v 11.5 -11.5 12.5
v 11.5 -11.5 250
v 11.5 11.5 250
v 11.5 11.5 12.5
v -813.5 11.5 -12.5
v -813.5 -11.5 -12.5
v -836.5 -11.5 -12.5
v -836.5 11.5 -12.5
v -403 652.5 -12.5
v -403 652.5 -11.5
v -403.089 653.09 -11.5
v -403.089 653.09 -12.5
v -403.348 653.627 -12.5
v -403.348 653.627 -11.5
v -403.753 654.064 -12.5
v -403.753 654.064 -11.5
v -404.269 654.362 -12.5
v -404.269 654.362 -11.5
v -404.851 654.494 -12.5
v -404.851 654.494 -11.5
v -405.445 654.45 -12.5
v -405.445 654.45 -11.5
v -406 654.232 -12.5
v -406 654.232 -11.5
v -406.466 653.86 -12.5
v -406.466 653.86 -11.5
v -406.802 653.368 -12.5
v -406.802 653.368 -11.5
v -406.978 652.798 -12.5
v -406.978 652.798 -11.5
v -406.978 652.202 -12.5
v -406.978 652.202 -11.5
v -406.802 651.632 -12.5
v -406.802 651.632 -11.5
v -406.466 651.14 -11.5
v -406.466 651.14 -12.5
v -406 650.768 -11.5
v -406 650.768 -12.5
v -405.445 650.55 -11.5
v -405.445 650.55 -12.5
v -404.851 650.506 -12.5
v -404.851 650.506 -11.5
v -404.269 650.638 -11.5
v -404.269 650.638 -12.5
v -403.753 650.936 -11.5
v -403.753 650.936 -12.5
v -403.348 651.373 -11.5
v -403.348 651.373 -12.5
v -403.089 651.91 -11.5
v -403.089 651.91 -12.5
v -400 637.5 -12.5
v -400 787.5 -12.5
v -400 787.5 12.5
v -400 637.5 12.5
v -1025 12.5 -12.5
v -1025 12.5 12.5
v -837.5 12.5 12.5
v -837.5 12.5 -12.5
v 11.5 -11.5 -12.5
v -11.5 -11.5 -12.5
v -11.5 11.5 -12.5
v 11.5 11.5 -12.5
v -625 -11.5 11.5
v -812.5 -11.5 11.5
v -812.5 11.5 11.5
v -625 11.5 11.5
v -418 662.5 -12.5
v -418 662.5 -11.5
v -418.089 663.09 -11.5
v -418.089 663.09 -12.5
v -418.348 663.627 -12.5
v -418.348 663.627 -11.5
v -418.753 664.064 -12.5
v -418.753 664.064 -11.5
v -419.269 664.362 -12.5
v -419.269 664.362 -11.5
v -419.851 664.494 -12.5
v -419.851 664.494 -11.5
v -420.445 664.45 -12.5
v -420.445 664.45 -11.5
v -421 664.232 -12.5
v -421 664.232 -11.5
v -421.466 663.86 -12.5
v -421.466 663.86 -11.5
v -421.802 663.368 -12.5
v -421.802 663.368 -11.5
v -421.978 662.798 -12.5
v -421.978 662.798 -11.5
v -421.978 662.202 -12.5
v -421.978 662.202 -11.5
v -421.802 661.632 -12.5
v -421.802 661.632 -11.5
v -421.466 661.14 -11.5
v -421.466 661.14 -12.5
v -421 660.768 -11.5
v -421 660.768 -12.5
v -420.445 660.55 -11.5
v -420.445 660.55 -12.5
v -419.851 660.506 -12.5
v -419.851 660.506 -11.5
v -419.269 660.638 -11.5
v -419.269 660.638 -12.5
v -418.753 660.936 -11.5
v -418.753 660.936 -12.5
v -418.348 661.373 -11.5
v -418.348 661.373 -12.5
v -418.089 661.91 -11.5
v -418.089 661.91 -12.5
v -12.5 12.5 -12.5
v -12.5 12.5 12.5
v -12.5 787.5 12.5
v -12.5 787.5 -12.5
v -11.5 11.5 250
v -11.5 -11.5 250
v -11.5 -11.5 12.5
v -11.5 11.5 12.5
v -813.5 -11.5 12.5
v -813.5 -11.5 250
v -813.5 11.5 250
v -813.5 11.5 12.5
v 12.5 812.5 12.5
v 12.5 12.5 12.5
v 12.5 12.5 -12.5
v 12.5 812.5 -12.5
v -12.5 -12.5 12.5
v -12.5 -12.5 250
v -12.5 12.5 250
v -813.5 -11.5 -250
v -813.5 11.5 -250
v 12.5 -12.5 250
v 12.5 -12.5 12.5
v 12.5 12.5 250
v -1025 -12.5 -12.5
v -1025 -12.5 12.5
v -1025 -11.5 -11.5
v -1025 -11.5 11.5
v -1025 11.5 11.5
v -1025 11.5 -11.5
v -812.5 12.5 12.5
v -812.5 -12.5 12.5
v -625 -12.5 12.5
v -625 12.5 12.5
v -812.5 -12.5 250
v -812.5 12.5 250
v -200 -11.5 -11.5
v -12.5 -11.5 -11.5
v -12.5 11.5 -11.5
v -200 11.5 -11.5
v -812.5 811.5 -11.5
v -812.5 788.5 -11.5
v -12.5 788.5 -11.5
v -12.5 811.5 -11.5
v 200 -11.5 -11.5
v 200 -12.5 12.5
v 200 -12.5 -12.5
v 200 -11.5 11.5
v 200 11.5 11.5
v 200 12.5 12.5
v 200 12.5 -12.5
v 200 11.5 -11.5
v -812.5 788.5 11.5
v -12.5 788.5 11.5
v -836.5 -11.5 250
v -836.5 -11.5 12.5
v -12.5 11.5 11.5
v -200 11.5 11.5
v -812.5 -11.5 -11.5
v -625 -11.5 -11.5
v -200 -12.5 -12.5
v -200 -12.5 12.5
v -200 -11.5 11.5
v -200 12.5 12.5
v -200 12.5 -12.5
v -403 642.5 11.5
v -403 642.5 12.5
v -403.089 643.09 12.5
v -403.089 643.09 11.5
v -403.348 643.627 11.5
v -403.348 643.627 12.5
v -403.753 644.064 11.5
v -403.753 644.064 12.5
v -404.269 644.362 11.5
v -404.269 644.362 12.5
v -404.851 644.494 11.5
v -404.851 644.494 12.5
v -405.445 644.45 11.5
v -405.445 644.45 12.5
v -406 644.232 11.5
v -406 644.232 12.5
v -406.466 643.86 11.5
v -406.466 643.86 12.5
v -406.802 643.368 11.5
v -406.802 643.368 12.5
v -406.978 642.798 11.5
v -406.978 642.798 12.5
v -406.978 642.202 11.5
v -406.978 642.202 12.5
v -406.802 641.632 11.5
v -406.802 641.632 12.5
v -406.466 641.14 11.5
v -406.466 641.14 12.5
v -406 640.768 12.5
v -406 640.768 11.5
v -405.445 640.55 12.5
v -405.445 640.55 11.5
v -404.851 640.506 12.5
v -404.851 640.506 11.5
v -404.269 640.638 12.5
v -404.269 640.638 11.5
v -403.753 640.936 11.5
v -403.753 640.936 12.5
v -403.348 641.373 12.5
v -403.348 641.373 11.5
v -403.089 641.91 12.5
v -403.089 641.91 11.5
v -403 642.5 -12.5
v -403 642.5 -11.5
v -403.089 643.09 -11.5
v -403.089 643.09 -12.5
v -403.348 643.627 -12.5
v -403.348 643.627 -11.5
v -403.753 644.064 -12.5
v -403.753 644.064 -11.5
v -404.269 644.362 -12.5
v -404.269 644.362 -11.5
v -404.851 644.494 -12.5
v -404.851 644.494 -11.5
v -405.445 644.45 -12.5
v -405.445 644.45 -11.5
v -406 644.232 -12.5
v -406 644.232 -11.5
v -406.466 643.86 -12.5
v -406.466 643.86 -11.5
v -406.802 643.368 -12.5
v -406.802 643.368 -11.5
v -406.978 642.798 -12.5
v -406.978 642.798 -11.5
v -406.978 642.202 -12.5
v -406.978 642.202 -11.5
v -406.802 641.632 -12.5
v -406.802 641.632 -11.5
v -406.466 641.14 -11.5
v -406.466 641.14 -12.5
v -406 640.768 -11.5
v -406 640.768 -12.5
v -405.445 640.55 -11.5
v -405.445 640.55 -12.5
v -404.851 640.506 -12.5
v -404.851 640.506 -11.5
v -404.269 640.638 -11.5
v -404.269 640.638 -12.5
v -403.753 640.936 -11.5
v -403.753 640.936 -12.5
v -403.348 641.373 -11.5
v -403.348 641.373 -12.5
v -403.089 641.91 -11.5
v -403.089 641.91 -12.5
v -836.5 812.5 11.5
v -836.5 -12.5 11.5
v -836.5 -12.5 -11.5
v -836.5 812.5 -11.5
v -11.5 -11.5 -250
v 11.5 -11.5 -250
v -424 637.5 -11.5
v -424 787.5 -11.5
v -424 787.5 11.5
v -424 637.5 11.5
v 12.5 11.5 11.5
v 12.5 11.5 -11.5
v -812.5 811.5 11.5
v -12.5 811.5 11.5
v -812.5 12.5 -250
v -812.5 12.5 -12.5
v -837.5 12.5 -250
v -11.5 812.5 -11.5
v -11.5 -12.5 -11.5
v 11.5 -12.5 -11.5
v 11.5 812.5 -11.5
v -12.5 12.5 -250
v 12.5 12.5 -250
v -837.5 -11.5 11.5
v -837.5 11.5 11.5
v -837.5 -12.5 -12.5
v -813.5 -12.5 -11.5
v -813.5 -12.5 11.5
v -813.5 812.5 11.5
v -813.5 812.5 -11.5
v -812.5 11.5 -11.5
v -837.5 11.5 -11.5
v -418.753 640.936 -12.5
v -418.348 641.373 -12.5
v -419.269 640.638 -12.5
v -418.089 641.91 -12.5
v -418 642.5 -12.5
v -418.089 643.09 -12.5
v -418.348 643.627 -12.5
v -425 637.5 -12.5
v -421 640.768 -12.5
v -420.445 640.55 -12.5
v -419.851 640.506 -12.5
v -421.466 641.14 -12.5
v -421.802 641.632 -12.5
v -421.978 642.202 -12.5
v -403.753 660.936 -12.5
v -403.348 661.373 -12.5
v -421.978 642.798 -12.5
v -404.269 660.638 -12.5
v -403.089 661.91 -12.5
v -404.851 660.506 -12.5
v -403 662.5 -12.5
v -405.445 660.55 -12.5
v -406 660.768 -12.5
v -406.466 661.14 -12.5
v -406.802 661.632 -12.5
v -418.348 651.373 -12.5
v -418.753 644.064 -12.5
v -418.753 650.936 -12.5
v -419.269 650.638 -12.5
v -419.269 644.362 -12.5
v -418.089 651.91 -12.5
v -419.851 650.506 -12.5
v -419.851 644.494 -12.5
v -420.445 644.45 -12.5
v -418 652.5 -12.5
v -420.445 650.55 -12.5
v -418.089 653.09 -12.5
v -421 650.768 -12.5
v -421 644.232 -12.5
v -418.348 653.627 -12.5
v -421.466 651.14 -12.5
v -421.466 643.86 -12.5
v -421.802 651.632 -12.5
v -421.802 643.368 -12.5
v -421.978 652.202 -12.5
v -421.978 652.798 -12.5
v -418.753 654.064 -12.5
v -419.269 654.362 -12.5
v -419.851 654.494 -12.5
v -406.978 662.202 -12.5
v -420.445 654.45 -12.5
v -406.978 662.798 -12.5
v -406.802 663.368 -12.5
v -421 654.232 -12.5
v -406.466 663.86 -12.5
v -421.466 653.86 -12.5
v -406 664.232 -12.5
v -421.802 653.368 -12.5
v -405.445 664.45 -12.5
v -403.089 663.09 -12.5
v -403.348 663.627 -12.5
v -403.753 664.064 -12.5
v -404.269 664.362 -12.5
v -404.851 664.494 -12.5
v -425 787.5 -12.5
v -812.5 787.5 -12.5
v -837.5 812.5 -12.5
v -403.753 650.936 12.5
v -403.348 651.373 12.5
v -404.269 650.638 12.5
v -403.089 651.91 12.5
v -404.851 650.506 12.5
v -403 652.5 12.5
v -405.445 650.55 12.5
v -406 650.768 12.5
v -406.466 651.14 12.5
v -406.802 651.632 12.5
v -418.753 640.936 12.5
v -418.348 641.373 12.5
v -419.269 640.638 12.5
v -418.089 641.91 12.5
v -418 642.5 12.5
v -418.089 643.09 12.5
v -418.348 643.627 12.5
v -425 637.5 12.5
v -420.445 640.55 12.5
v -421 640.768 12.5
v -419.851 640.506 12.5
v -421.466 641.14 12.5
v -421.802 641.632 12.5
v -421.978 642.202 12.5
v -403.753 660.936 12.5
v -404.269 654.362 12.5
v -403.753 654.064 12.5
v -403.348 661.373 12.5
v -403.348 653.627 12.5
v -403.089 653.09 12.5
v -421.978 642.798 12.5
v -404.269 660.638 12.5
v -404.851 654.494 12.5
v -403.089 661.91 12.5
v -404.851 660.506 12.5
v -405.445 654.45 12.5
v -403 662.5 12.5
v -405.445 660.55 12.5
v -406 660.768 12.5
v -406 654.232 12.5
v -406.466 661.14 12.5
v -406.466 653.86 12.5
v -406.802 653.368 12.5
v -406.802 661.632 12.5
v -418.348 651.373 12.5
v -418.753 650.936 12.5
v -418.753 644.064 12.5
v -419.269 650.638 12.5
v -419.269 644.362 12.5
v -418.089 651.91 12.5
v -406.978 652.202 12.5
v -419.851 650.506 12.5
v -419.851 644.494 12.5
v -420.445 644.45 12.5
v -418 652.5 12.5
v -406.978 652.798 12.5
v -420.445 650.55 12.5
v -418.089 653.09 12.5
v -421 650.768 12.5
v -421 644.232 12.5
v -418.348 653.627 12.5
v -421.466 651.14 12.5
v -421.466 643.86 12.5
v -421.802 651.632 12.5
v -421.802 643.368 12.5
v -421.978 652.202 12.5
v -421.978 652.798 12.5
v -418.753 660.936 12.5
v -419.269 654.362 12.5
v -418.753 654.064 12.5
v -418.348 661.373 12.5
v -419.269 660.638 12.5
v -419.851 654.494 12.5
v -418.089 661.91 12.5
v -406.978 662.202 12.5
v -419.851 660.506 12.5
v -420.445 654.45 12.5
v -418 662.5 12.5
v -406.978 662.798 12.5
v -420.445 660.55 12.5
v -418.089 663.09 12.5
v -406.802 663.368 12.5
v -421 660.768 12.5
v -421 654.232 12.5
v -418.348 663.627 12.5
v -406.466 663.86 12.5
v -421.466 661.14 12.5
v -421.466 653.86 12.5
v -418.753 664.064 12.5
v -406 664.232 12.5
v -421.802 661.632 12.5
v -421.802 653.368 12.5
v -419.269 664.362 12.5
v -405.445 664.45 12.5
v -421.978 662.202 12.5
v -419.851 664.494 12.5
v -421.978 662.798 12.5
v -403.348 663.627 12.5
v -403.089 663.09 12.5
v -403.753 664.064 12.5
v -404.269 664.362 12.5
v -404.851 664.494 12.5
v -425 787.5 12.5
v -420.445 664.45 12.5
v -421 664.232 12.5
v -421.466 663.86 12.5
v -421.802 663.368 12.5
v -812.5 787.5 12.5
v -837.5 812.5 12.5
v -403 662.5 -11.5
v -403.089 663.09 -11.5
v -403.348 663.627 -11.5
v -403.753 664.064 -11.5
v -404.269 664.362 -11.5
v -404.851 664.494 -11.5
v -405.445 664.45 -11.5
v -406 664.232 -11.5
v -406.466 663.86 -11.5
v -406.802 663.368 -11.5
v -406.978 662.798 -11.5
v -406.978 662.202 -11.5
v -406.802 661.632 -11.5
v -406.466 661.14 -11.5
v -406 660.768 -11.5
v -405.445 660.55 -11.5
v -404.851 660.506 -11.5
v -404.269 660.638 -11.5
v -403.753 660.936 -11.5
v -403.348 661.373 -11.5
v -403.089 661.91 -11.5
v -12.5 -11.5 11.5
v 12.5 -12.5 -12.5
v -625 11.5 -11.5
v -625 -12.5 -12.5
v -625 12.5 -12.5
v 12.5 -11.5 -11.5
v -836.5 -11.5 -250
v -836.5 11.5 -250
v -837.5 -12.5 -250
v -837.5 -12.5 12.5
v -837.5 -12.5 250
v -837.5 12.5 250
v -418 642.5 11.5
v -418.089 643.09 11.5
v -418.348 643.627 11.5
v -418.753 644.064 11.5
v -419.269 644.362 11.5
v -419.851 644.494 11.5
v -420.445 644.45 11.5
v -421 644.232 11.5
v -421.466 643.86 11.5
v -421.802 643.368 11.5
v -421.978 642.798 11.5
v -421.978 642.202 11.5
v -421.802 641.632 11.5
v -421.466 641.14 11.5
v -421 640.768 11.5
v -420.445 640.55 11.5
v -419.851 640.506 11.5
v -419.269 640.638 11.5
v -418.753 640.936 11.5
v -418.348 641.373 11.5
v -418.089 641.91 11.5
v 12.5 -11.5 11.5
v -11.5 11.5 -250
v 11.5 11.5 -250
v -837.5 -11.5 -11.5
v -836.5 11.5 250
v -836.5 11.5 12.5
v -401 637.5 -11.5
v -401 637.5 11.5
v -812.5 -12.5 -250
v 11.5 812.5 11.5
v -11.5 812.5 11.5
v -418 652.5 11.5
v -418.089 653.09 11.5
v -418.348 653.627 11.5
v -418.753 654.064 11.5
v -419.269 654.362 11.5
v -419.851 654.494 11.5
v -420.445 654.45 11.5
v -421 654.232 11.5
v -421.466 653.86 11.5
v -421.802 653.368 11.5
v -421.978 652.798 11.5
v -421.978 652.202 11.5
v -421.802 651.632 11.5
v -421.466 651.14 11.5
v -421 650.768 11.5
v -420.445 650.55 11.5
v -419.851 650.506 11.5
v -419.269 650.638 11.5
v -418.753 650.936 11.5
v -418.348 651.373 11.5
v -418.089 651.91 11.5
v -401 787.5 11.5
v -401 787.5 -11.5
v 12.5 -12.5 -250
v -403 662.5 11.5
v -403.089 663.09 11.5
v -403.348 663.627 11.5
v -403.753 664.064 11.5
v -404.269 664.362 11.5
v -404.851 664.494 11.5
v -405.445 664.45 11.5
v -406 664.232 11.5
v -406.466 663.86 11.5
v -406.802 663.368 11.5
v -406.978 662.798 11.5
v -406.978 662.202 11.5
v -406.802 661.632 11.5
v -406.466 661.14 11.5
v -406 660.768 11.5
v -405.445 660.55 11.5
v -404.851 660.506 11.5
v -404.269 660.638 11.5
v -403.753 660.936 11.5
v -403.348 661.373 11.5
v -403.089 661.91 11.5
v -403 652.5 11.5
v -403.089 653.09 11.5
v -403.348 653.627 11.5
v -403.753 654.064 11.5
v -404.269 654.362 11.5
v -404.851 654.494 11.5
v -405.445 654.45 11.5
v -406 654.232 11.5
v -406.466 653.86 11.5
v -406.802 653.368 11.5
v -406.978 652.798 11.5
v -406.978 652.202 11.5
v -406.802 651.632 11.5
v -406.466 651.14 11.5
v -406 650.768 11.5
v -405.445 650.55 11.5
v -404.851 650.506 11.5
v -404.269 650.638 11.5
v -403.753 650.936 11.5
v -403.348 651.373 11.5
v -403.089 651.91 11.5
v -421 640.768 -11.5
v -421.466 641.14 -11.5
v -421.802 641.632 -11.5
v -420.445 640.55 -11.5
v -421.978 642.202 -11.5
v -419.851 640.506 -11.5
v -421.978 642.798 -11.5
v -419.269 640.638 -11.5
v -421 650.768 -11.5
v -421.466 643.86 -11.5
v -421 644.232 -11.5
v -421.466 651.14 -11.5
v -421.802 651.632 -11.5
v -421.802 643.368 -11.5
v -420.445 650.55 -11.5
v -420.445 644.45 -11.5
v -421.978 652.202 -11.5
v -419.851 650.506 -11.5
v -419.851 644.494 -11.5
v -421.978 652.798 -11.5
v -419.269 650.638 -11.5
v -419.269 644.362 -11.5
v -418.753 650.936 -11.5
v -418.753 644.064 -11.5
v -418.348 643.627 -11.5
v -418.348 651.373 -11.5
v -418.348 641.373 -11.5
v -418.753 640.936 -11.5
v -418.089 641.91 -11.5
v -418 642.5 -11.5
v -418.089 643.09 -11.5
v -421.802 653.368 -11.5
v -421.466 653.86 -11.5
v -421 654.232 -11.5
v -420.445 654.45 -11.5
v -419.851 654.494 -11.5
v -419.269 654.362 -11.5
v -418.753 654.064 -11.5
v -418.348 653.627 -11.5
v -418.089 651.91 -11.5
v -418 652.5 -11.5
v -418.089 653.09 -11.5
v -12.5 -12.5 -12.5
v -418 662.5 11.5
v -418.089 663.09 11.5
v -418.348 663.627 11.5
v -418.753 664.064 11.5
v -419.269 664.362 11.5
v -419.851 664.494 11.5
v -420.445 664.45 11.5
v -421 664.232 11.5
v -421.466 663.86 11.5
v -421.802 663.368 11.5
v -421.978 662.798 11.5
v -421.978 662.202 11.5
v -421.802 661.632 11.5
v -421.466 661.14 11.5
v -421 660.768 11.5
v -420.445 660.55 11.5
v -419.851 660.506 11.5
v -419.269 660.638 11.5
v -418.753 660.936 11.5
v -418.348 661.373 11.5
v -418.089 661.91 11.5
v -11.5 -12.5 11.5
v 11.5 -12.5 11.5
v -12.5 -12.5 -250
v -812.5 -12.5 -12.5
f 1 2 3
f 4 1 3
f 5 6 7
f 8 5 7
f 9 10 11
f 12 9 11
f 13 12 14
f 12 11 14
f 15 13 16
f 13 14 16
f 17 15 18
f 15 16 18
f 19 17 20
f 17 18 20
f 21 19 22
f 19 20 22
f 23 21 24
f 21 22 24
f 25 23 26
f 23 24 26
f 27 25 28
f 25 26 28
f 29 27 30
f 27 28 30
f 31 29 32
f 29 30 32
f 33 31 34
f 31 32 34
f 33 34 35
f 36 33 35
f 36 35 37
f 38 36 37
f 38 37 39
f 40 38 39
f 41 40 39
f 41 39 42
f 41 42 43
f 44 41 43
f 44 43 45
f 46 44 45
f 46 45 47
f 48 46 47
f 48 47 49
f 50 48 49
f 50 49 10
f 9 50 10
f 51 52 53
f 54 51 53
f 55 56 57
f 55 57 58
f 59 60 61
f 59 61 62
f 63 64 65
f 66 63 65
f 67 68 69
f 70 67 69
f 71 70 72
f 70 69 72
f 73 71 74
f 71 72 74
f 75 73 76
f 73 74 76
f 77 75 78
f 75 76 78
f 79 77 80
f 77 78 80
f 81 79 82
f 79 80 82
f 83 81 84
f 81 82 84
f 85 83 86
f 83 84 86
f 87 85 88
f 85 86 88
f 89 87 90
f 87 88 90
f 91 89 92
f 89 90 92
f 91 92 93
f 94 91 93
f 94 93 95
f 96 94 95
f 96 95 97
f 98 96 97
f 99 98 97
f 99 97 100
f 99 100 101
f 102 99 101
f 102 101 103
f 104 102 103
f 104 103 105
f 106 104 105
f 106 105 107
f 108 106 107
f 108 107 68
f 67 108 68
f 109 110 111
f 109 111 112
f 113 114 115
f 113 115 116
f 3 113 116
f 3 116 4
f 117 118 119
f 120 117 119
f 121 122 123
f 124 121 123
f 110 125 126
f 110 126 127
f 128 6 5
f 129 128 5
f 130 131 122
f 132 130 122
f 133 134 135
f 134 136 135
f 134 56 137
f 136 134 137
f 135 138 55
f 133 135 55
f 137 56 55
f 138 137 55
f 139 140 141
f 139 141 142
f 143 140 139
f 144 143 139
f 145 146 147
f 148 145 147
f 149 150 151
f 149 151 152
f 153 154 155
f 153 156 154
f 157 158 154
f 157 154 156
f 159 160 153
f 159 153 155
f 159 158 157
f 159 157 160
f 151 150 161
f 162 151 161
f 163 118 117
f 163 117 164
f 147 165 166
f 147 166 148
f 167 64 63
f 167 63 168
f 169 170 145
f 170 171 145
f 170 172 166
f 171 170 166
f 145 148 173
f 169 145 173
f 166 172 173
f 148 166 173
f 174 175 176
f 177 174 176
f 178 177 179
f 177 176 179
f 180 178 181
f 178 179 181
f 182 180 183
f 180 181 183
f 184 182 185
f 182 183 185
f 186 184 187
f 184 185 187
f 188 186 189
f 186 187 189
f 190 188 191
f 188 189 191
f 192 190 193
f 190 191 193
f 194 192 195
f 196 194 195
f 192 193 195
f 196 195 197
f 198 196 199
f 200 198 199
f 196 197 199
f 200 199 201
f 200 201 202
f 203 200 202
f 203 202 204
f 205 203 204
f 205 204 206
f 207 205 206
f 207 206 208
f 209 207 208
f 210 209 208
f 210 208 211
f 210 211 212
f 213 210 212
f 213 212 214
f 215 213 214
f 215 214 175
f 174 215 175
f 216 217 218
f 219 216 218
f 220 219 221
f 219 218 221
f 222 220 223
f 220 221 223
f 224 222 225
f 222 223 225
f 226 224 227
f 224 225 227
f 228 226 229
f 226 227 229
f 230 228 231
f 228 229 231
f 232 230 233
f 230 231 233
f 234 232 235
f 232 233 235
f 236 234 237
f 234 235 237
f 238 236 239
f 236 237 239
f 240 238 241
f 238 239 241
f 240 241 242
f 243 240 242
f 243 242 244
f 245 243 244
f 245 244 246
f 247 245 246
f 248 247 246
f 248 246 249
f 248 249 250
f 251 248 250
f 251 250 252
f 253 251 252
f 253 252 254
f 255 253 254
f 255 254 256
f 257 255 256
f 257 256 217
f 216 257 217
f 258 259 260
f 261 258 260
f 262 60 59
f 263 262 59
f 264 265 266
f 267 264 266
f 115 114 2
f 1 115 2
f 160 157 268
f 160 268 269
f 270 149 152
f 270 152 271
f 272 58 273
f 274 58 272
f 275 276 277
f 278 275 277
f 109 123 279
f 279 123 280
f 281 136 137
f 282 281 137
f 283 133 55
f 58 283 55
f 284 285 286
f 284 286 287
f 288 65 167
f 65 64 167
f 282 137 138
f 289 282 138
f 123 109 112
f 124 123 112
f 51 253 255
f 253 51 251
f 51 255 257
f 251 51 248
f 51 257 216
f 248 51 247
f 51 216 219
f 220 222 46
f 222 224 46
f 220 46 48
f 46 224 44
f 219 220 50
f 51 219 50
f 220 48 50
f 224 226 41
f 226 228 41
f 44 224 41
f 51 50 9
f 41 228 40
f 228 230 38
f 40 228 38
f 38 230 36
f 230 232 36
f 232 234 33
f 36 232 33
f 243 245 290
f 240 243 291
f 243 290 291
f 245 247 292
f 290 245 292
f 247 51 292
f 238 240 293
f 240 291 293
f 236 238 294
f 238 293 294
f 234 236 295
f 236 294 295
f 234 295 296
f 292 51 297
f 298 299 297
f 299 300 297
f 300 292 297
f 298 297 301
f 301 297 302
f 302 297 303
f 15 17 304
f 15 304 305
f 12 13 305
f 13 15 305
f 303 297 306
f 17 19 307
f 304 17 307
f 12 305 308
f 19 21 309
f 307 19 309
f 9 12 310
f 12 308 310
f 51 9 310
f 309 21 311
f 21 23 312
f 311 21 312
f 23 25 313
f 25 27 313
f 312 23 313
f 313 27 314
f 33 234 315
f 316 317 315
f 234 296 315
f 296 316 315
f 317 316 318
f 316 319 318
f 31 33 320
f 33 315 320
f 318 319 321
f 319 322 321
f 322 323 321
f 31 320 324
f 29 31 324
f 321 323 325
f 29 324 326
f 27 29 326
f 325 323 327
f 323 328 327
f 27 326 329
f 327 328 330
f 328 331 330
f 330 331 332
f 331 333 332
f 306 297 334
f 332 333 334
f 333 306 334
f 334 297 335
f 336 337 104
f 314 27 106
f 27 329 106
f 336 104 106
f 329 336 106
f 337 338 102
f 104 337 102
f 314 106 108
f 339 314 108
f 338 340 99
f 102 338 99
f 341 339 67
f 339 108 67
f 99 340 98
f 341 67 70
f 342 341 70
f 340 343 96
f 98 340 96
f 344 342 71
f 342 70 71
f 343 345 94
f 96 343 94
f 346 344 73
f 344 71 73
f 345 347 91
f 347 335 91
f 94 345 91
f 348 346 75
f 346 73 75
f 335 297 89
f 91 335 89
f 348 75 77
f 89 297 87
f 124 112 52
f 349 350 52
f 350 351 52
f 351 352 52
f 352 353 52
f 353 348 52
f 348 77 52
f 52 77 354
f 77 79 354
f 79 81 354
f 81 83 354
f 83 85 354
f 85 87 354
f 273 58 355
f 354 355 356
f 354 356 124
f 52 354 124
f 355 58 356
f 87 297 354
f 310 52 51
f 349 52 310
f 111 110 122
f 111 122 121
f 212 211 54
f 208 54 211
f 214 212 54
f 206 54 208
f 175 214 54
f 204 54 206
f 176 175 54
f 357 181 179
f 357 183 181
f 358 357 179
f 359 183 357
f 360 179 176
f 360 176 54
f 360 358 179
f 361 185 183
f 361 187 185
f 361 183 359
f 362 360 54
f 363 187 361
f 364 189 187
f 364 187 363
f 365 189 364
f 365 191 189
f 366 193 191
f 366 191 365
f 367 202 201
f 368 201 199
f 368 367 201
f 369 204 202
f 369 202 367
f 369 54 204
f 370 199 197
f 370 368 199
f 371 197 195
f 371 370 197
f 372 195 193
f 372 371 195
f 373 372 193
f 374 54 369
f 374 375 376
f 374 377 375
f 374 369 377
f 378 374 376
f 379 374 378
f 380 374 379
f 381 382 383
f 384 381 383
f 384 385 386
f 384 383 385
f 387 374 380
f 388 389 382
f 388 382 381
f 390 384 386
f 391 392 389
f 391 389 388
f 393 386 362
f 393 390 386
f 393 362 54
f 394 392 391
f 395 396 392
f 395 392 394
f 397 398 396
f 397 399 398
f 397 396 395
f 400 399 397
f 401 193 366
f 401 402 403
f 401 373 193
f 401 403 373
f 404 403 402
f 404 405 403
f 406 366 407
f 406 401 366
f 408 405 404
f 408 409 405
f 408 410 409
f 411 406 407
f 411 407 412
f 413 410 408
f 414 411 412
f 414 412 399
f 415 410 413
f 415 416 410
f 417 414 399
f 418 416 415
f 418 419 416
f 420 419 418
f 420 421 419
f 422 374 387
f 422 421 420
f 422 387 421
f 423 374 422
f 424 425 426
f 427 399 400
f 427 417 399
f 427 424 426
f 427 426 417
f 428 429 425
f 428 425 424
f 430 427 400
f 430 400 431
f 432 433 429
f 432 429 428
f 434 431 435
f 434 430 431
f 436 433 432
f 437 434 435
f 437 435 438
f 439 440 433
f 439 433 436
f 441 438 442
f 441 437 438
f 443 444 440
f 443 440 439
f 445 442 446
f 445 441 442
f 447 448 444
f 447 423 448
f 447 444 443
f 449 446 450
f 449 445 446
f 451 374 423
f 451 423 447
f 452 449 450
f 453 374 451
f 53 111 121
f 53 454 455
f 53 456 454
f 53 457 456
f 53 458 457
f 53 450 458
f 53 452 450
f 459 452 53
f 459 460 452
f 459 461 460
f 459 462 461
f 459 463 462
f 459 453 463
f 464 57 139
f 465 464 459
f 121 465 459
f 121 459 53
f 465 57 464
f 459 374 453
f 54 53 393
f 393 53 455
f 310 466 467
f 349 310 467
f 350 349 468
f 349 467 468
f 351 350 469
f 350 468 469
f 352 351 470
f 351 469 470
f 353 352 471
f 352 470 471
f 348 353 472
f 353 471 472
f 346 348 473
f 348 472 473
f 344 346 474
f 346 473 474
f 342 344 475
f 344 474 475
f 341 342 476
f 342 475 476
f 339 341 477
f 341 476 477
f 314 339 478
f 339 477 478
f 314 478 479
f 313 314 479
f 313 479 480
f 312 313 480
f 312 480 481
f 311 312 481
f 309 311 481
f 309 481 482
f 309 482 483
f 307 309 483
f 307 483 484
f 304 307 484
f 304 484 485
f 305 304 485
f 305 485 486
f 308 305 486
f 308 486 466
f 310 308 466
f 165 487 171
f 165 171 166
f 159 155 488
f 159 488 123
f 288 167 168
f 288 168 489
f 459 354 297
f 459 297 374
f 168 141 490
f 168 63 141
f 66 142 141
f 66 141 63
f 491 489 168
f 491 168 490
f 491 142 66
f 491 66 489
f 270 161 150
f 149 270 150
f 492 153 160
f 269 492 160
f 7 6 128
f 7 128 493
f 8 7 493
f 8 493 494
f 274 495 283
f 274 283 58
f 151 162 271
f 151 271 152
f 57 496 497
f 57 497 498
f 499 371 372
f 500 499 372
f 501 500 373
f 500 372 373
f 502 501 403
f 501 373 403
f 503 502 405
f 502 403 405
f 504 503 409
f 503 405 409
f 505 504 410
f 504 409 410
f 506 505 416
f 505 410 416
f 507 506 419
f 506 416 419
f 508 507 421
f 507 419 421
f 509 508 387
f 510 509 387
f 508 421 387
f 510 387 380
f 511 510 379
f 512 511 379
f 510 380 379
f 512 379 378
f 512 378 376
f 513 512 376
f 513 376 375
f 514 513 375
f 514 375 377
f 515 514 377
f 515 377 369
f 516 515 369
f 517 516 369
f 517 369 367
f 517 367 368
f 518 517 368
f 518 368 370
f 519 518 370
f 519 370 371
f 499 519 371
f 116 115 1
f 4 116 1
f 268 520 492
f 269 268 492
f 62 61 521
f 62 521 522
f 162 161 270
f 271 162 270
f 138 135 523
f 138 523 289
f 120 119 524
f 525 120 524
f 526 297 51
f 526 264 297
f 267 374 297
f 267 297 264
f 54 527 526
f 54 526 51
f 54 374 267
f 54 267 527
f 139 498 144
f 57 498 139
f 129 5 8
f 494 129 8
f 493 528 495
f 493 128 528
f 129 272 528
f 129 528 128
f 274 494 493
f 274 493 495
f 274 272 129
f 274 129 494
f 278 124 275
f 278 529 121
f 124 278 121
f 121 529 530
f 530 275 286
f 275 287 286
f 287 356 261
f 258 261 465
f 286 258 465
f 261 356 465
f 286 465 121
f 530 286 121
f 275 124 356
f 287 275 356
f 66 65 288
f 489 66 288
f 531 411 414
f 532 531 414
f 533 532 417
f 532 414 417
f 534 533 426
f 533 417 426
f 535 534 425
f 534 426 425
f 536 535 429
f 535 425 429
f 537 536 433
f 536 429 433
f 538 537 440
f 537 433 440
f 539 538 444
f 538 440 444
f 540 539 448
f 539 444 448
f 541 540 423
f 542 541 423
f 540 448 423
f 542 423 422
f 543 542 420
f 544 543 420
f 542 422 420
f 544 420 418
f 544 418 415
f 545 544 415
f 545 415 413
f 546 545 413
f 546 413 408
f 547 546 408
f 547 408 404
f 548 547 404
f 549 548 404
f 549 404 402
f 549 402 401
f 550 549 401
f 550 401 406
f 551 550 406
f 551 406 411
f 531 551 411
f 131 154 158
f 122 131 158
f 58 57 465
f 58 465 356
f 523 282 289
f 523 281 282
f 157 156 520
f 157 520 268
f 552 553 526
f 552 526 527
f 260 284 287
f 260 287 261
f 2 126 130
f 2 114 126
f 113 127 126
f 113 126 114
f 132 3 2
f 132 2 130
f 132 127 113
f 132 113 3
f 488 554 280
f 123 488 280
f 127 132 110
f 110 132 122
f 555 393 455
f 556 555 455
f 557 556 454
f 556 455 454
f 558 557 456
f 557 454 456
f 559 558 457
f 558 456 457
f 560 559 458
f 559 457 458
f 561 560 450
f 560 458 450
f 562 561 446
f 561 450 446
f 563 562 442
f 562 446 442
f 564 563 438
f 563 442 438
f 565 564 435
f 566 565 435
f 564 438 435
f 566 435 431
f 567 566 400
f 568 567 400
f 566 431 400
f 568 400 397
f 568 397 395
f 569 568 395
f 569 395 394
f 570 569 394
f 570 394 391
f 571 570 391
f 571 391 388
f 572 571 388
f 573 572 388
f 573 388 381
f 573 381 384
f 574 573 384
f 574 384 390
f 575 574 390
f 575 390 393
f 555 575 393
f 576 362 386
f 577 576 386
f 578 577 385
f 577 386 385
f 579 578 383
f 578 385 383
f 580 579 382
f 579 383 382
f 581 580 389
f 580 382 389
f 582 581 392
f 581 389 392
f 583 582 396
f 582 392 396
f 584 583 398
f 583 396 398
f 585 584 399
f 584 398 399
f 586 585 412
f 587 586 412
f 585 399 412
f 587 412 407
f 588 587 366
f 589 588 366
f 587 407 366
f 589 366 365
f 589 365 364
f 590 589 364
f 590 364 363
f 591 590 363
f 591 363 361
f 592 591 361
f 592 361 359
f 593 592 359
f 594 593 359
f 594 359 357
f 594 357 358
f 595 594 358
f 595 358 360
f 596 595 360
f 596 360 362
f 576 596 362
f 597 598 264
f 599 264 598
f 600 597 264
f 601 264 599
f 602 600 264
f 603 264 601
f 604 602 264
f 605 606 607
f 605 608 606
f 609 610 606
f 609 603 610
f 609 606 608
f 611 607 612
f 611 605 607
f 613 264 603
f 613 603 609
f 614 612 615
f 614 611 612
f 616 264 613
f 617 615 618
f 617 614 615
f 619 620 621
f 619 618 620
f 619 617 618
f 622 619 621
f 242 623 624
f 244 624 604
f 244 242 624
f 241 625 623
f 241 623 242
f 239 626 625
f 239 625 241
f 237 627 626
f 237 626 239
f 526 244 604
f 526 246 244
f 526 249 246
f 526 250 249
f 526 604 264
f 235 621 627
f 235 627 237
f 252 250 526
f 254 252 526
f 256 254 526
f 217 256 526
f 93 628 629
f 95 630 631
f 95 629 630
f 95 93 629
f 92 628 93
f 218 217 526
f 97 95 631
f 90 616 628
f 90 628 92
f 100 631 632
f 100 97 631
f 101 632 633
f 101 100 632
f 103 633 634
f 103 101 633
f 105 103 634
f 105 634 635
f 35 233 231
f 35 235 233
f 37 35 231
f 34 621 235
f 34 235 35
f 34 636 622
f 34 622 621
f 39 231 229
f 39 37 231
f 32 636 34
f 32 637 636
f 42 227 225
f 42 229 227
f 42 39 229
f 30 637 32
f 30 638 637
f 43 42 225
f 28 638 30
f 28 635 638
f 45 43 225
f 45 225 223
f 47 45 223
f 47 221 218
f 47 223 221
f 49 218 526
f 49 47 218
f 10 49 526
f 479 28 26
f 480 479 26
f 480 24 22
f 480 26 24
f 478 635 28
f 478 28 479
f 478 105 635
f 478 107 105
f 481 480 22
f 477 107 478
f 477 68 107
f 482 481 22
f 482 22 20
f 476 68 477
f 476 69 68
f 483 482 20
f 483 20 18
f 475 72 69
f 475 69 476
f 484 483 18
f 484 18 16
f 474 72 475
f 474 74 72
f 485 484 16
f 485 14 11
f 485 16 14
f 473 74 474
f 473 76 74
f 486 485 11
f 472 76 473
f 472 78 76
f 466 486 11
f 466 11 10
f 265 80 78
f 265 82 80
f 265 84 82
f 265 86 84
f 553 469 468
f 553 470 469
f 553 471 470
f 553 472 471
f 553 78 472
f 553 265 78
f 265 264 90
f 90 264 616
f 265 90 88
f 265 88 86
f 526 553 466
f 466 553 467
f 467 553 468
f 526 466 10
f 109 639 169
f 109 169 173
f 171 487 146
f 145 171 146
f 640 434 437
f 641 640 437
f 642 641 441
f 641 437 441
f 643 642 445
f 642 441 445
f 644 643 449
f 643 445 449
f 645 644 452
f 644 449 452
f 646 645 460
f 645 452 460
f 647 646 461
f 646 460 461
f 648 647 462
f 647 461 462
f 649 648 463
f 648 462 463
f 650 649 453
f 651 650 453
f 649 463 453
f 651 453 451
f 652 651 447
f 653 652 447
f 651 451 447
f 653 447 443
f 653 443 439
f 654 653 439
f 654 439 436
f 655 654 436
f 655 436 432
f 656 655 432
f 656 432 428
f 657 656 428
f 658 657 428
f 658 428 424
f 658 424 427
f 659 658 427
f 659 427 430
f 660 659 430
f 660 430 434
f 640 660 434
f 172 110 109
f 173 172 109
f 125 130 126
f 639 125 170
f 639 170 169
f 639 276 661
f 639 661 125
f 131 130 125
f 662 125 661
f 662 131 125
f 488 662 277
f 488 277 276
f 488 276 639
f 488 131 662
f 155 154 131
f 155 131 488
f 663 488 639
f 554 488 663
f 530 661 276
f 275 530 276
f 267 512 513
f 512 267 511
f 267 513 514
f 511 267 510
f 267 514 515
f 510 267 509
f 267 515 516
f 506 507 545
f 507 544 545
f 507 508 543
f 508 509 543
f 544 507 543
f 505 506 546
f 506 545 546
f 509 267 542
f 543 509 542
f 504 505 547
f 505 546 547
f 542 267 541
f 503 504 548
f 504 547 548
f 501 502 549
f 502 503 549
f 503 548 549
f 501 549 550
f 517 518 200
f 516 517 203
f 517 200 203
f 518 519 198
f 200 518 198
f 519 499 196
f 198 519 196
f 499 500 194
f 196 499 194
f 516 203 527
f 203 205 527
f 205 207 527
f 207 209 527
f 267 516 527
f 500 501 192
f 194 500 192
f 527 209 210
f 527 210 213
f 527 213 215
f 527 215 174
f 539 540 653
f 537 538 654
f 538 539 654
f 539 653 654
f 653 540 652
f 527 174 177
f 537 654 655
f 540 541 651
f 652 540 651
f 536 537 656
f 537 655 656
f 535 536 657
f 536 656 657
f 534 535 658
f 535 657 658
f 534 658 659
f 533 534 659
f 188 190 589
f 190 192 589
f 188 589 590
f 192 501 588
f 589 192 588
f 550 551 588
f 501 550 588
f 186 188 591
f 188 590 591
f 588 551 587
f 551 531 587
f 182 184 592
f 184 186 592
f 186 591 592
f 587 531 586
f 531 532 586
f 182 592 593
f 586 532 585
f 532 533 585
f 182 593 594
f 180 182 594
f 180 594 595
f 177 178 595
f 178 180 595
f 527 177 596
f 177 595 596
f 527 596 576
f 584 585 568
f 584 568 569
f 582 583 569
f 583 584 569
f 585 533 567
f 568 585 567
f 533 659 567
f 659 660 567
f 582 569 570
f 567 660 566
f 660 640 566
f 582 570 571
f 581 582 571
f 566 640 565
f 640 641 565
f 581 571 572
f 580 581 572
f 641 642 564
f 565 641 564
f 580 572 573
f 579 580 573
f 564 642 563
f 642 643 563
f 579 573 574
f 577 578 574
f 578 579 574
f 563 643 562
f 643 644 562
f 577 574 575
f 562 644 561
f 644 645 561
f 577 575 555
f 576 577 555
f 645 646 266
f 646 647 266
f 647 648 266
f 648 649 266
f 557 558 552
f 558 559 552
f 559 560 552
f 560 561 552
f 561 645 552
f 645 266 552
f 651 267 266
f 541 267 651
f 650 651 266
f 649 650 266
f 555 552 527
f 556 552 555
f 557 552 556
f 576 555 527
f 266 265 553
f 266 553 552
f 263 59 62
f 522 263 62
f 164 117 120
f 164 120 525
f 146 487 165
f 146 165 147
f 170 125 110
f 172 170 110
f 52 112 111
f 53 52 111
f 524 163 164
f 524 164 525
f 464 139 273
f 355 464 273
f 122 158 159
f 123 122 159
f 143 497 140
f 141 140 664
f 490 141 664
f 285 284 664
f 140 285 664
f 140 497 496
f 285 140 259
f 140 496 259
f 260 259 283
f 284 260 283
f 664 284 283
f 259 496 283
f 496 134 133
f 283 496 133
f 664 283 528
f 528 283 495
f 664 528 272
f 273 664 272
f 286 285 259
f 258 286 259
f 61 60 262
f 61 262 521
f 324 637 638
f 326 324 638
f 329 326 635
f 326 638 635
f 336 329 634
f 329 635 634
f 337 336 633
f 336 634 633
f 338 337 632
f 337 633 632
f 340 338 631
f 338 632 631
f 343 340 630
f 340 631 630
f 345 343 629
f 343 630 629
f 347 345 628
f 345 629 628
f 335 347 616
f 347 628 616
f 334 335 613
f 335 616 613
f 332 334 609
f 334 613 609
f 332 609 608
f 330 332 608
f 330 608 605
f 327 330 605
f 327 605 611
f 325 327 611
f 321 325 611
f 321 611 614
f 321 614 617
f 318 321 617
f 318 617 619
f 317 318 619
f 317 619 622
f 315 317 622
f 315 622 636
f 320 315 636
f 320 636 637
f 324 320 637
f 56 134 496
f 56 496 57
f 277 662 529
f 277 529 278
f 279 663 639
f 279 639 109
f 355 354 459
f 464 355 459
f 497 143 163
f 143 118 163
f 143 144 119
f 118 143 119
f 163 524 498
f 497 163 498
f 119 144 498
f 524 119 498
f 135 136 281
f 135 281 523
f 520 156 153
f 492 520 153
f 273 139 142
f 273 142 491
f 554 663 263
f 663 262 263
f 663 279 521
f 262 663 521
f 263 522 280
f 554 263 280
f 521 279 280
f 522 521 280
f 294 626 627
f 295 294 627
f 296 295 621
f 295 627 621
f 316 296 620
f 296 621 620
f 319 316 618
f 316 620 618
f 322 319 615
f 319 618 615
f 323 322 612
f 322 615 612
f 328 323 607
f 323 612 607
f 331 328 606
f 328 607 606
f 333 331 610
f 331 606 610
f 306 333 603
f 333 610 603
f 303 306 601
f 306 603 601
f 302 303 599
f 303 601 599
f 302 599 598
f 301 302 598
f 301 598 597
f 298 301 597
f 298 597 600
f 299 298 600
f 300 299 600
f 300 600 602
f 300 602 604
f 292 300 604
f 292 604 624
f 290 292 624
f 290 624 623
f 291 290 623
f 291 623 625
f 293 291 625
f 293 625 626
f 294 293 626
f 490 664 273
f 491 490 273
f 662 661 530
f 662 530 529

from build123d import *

# Parameters (mm, degrees)
SKETCH1_W           = 25
SKETCH1_H           = 25
SKETCH1_W_2         = 23
SKETCH1_H_2         = 23
BOSS_EXTRUDE1_DEPTH = 250
SKETCH2_W           = 25
SKETCH2_H           = 25
SKETCH2_W_2         = 23
SKETCH2_H_2         = 23
BOSS_EXTRUDE2_DEPTH = 200
SKETCH4_W           = 25
SKETCH4_H           = 25
CUT_EXTRUDE6_DEPTH  = 25
BOSS_EXTRUDE3_START = -12.5
SKETCH3_W           = 25
SKETCH3_H           = 25
SKETCH3_W_2         = 23
SKETCH3_H_2         = 23
BOSS_EXTRUDE3_DEPTH = 825
SKETCH5_W           = 25
SKETCH5_H           = 25
SKETCH5_W_2         = 23
SKETCH5_H_2         = 23
BOSS_EXTRUDE4_DEPTH = 400
SKETCH6_W           = 25
SKETCH6_H           = 25
SKETCH6_W_2         = 23
SKETCH6_H_2         = 23
BOSS_EXTRUDE5_DEPTH = 150
SKETCH7_R           = 2
CUT_EXTRUDE7_DEPTH  = 25


with BuildPart() as part:
    # Sketch1 → Boss-Extrude1 (new, symmetric)
    with BuildSketch(Plane.XY):
        Rectangle(SKETCH1_W, SKETCH1_H)
        Rectangle(SKETCH1_W_2, SKETCH1_H_2, mode=Mode.SUBTRACT)
    boss_extrude1 = extrude(amount=BOSS_EXTRUDE1_DEPTH, both=True)

    # Sketch2 → Boss-Extrude2 (add, symmetric)
    with BuildSketch(Plane(origin=(0, 0, 0), x_dir=(0, 0, -1), z_dir=(1, 0, 0))):
        Rectangle(SKETCH2_W, SKETCH2_H)
        Rectangle(SKETCH2_W_2, SKETCH2_H_2, mode=Mode.SUBTRACT)
    boss_extrude2 = extrude(amount=BOSS_EXTRUDE2_DEPTH, both=True)

    # Sketch4 → Cut-Extrude6 (cut)
    with BuildSketch(Plane.XZ.offset(12.5)):
        Rectangle(SKETCH4_W, SKETCH4_H)
    cut_extrude6 = extrude(amount=-CUT_EXTRUDE6_DEPTH, mode=Mode.SUBTRACT)


with BuildPart() as cut_extrude6_piece_1:
    # of the separate pieces the step leaves, piece 1, a body of its own (cut_extrude6_pieces)
    add(part.part.solids().sort_by_distance((-12.5, 12.5, -250))[0])



with BuildPart() as cut_extrude6_piece_2:
    # of the separate pieces the step leaves, piece 2, a body of its own (cut_extrude6_pieces)
    add(part.part.solids().sort_by_distance((-12.5, 12.5, 250))[0])


with BuildPart() as cut_extrude6_piece_3:
    # of the separate pieces the step leaves, piece 3, a body of its own (cut_extrude6_pieces)
    add(part.part.solids().sort_by_distance((-200, 12.5, -12.5))[0])


with BuildPart() as cut_extrude6_piece_4:
    # of the separate pieces the step leaves, piece 4, a body of its own (cut_extrude6_pieces)
    add(part.part.solids().sort_by_distance((200, 12.5, 12.5))[0])


with BuildPart() as cut_extrude6_piece_1_1:
    add(cut_extrude6_piece_1.part)

    add(cut_extrude6_piece_2.part)  # Boss-Extrude3 merges Cut-Extrude6 piece 2

    add(cut_extrude6_piece_3.part)  # Boss-Extrude3 merges Cut-Extrude6 piece 3

    add(cut_extrude6_piece_4.part)  # Boss-Extrude3 merges Cut-Extrude6 piece 4
    # Sketch3 → Boss-Extrude3 (add)
    with BuildSketch(Plane(origin=(0, 0, 0), x_dir=(1, 0, 0), z_dir=(0, 1, 0)).offset(BOSS_EXTRUDE3_START)):
        Rectangle(SKETCH3_W, SKETCH3_H)
        Rectangle(SKETCH3_W_2, SKETCH3_H_2, mode=Mode.SUBTRACT)
    boss_extrude3 = extrude(amount=BOSS_EXTRUDE3_DEPTH)

    # Sketch5 → Boss-Extrude4 (add)
    with BuildSketch(Plane.ZY.offset(12.5)):
        with Locations((0, 800)):
            Rectangle(SKETCH5_W, SKETCH5_H)
        with Locations((0, 800)):
            Rectangle(SKETCH5_W_2, SKETCH5_H_2, mode=Mode.SUBTRACT)
    boss_extrude4 = extrude(amount=BOSS_EXTRUDE4_DEPTH)

    # Mirror1: Boss-Extrude1, Boss-Extrude2, Cut-Extrude6, Boss-Extrude3, Boss-Extrude4 across plane
    add(boss_extrude1.mirror(Plane.ZY.offset(412.5)))
    add(boss_extrude2.mirror(Plane.ZY.offset(412.5)))
    add(cut_extrude6.mirror(Plane.ZY.offset(412.5)), mode=Mode.SUBTRACT)
    add(boss_extrude3.mirror(Plane.ZY.offset(412.5)))
    add(boss_extrude4.mirror(Plane.ZY.offset(412.5)))

    # Sketch6 → Boss-Extrude5 (add)
    with BuildSketch(Plane.XZ.offset(-787.5)):
        with Locations((-412.5, 0)):
            Rectangle(SKETCH6_W, SKETCH6_H)
        with Locations((-412.5, 0)):
            Rectangle(SKETCH6_W_2, SKETCH6_H_2, mode=Mode.SUBTRACT)
    extrude(amount=BOSS_EXTRUDE5_DEPTH)

    # Sketch7 → Cut-Extrude7 (cut)
    with BuildSketch(Plane.XY.offset(12.5)):
        with Locations((-420, 662.5)):
            Circle(SKETCH7_R)
        with Locations((-405, 662.5)):
            Circle(SKETCH7_R)
        with Locations((-420, 652.5)):
            Circle(SKETCH7_R)
        with Locations((-405, 652.5)):
            Circle(SKETCH7_R)
        with Locations((-420, 642.5)):
            Circle(SKETCH7_R)
        with Locations((-405, 642.5)):
            Circle(SKETCH7_R)
    extrude(amount=-CUT_EXTRUDE7_DEPTH, mode=Mode.SUBTRACT)


solid = cut_extrude6_piece_1_1.part
